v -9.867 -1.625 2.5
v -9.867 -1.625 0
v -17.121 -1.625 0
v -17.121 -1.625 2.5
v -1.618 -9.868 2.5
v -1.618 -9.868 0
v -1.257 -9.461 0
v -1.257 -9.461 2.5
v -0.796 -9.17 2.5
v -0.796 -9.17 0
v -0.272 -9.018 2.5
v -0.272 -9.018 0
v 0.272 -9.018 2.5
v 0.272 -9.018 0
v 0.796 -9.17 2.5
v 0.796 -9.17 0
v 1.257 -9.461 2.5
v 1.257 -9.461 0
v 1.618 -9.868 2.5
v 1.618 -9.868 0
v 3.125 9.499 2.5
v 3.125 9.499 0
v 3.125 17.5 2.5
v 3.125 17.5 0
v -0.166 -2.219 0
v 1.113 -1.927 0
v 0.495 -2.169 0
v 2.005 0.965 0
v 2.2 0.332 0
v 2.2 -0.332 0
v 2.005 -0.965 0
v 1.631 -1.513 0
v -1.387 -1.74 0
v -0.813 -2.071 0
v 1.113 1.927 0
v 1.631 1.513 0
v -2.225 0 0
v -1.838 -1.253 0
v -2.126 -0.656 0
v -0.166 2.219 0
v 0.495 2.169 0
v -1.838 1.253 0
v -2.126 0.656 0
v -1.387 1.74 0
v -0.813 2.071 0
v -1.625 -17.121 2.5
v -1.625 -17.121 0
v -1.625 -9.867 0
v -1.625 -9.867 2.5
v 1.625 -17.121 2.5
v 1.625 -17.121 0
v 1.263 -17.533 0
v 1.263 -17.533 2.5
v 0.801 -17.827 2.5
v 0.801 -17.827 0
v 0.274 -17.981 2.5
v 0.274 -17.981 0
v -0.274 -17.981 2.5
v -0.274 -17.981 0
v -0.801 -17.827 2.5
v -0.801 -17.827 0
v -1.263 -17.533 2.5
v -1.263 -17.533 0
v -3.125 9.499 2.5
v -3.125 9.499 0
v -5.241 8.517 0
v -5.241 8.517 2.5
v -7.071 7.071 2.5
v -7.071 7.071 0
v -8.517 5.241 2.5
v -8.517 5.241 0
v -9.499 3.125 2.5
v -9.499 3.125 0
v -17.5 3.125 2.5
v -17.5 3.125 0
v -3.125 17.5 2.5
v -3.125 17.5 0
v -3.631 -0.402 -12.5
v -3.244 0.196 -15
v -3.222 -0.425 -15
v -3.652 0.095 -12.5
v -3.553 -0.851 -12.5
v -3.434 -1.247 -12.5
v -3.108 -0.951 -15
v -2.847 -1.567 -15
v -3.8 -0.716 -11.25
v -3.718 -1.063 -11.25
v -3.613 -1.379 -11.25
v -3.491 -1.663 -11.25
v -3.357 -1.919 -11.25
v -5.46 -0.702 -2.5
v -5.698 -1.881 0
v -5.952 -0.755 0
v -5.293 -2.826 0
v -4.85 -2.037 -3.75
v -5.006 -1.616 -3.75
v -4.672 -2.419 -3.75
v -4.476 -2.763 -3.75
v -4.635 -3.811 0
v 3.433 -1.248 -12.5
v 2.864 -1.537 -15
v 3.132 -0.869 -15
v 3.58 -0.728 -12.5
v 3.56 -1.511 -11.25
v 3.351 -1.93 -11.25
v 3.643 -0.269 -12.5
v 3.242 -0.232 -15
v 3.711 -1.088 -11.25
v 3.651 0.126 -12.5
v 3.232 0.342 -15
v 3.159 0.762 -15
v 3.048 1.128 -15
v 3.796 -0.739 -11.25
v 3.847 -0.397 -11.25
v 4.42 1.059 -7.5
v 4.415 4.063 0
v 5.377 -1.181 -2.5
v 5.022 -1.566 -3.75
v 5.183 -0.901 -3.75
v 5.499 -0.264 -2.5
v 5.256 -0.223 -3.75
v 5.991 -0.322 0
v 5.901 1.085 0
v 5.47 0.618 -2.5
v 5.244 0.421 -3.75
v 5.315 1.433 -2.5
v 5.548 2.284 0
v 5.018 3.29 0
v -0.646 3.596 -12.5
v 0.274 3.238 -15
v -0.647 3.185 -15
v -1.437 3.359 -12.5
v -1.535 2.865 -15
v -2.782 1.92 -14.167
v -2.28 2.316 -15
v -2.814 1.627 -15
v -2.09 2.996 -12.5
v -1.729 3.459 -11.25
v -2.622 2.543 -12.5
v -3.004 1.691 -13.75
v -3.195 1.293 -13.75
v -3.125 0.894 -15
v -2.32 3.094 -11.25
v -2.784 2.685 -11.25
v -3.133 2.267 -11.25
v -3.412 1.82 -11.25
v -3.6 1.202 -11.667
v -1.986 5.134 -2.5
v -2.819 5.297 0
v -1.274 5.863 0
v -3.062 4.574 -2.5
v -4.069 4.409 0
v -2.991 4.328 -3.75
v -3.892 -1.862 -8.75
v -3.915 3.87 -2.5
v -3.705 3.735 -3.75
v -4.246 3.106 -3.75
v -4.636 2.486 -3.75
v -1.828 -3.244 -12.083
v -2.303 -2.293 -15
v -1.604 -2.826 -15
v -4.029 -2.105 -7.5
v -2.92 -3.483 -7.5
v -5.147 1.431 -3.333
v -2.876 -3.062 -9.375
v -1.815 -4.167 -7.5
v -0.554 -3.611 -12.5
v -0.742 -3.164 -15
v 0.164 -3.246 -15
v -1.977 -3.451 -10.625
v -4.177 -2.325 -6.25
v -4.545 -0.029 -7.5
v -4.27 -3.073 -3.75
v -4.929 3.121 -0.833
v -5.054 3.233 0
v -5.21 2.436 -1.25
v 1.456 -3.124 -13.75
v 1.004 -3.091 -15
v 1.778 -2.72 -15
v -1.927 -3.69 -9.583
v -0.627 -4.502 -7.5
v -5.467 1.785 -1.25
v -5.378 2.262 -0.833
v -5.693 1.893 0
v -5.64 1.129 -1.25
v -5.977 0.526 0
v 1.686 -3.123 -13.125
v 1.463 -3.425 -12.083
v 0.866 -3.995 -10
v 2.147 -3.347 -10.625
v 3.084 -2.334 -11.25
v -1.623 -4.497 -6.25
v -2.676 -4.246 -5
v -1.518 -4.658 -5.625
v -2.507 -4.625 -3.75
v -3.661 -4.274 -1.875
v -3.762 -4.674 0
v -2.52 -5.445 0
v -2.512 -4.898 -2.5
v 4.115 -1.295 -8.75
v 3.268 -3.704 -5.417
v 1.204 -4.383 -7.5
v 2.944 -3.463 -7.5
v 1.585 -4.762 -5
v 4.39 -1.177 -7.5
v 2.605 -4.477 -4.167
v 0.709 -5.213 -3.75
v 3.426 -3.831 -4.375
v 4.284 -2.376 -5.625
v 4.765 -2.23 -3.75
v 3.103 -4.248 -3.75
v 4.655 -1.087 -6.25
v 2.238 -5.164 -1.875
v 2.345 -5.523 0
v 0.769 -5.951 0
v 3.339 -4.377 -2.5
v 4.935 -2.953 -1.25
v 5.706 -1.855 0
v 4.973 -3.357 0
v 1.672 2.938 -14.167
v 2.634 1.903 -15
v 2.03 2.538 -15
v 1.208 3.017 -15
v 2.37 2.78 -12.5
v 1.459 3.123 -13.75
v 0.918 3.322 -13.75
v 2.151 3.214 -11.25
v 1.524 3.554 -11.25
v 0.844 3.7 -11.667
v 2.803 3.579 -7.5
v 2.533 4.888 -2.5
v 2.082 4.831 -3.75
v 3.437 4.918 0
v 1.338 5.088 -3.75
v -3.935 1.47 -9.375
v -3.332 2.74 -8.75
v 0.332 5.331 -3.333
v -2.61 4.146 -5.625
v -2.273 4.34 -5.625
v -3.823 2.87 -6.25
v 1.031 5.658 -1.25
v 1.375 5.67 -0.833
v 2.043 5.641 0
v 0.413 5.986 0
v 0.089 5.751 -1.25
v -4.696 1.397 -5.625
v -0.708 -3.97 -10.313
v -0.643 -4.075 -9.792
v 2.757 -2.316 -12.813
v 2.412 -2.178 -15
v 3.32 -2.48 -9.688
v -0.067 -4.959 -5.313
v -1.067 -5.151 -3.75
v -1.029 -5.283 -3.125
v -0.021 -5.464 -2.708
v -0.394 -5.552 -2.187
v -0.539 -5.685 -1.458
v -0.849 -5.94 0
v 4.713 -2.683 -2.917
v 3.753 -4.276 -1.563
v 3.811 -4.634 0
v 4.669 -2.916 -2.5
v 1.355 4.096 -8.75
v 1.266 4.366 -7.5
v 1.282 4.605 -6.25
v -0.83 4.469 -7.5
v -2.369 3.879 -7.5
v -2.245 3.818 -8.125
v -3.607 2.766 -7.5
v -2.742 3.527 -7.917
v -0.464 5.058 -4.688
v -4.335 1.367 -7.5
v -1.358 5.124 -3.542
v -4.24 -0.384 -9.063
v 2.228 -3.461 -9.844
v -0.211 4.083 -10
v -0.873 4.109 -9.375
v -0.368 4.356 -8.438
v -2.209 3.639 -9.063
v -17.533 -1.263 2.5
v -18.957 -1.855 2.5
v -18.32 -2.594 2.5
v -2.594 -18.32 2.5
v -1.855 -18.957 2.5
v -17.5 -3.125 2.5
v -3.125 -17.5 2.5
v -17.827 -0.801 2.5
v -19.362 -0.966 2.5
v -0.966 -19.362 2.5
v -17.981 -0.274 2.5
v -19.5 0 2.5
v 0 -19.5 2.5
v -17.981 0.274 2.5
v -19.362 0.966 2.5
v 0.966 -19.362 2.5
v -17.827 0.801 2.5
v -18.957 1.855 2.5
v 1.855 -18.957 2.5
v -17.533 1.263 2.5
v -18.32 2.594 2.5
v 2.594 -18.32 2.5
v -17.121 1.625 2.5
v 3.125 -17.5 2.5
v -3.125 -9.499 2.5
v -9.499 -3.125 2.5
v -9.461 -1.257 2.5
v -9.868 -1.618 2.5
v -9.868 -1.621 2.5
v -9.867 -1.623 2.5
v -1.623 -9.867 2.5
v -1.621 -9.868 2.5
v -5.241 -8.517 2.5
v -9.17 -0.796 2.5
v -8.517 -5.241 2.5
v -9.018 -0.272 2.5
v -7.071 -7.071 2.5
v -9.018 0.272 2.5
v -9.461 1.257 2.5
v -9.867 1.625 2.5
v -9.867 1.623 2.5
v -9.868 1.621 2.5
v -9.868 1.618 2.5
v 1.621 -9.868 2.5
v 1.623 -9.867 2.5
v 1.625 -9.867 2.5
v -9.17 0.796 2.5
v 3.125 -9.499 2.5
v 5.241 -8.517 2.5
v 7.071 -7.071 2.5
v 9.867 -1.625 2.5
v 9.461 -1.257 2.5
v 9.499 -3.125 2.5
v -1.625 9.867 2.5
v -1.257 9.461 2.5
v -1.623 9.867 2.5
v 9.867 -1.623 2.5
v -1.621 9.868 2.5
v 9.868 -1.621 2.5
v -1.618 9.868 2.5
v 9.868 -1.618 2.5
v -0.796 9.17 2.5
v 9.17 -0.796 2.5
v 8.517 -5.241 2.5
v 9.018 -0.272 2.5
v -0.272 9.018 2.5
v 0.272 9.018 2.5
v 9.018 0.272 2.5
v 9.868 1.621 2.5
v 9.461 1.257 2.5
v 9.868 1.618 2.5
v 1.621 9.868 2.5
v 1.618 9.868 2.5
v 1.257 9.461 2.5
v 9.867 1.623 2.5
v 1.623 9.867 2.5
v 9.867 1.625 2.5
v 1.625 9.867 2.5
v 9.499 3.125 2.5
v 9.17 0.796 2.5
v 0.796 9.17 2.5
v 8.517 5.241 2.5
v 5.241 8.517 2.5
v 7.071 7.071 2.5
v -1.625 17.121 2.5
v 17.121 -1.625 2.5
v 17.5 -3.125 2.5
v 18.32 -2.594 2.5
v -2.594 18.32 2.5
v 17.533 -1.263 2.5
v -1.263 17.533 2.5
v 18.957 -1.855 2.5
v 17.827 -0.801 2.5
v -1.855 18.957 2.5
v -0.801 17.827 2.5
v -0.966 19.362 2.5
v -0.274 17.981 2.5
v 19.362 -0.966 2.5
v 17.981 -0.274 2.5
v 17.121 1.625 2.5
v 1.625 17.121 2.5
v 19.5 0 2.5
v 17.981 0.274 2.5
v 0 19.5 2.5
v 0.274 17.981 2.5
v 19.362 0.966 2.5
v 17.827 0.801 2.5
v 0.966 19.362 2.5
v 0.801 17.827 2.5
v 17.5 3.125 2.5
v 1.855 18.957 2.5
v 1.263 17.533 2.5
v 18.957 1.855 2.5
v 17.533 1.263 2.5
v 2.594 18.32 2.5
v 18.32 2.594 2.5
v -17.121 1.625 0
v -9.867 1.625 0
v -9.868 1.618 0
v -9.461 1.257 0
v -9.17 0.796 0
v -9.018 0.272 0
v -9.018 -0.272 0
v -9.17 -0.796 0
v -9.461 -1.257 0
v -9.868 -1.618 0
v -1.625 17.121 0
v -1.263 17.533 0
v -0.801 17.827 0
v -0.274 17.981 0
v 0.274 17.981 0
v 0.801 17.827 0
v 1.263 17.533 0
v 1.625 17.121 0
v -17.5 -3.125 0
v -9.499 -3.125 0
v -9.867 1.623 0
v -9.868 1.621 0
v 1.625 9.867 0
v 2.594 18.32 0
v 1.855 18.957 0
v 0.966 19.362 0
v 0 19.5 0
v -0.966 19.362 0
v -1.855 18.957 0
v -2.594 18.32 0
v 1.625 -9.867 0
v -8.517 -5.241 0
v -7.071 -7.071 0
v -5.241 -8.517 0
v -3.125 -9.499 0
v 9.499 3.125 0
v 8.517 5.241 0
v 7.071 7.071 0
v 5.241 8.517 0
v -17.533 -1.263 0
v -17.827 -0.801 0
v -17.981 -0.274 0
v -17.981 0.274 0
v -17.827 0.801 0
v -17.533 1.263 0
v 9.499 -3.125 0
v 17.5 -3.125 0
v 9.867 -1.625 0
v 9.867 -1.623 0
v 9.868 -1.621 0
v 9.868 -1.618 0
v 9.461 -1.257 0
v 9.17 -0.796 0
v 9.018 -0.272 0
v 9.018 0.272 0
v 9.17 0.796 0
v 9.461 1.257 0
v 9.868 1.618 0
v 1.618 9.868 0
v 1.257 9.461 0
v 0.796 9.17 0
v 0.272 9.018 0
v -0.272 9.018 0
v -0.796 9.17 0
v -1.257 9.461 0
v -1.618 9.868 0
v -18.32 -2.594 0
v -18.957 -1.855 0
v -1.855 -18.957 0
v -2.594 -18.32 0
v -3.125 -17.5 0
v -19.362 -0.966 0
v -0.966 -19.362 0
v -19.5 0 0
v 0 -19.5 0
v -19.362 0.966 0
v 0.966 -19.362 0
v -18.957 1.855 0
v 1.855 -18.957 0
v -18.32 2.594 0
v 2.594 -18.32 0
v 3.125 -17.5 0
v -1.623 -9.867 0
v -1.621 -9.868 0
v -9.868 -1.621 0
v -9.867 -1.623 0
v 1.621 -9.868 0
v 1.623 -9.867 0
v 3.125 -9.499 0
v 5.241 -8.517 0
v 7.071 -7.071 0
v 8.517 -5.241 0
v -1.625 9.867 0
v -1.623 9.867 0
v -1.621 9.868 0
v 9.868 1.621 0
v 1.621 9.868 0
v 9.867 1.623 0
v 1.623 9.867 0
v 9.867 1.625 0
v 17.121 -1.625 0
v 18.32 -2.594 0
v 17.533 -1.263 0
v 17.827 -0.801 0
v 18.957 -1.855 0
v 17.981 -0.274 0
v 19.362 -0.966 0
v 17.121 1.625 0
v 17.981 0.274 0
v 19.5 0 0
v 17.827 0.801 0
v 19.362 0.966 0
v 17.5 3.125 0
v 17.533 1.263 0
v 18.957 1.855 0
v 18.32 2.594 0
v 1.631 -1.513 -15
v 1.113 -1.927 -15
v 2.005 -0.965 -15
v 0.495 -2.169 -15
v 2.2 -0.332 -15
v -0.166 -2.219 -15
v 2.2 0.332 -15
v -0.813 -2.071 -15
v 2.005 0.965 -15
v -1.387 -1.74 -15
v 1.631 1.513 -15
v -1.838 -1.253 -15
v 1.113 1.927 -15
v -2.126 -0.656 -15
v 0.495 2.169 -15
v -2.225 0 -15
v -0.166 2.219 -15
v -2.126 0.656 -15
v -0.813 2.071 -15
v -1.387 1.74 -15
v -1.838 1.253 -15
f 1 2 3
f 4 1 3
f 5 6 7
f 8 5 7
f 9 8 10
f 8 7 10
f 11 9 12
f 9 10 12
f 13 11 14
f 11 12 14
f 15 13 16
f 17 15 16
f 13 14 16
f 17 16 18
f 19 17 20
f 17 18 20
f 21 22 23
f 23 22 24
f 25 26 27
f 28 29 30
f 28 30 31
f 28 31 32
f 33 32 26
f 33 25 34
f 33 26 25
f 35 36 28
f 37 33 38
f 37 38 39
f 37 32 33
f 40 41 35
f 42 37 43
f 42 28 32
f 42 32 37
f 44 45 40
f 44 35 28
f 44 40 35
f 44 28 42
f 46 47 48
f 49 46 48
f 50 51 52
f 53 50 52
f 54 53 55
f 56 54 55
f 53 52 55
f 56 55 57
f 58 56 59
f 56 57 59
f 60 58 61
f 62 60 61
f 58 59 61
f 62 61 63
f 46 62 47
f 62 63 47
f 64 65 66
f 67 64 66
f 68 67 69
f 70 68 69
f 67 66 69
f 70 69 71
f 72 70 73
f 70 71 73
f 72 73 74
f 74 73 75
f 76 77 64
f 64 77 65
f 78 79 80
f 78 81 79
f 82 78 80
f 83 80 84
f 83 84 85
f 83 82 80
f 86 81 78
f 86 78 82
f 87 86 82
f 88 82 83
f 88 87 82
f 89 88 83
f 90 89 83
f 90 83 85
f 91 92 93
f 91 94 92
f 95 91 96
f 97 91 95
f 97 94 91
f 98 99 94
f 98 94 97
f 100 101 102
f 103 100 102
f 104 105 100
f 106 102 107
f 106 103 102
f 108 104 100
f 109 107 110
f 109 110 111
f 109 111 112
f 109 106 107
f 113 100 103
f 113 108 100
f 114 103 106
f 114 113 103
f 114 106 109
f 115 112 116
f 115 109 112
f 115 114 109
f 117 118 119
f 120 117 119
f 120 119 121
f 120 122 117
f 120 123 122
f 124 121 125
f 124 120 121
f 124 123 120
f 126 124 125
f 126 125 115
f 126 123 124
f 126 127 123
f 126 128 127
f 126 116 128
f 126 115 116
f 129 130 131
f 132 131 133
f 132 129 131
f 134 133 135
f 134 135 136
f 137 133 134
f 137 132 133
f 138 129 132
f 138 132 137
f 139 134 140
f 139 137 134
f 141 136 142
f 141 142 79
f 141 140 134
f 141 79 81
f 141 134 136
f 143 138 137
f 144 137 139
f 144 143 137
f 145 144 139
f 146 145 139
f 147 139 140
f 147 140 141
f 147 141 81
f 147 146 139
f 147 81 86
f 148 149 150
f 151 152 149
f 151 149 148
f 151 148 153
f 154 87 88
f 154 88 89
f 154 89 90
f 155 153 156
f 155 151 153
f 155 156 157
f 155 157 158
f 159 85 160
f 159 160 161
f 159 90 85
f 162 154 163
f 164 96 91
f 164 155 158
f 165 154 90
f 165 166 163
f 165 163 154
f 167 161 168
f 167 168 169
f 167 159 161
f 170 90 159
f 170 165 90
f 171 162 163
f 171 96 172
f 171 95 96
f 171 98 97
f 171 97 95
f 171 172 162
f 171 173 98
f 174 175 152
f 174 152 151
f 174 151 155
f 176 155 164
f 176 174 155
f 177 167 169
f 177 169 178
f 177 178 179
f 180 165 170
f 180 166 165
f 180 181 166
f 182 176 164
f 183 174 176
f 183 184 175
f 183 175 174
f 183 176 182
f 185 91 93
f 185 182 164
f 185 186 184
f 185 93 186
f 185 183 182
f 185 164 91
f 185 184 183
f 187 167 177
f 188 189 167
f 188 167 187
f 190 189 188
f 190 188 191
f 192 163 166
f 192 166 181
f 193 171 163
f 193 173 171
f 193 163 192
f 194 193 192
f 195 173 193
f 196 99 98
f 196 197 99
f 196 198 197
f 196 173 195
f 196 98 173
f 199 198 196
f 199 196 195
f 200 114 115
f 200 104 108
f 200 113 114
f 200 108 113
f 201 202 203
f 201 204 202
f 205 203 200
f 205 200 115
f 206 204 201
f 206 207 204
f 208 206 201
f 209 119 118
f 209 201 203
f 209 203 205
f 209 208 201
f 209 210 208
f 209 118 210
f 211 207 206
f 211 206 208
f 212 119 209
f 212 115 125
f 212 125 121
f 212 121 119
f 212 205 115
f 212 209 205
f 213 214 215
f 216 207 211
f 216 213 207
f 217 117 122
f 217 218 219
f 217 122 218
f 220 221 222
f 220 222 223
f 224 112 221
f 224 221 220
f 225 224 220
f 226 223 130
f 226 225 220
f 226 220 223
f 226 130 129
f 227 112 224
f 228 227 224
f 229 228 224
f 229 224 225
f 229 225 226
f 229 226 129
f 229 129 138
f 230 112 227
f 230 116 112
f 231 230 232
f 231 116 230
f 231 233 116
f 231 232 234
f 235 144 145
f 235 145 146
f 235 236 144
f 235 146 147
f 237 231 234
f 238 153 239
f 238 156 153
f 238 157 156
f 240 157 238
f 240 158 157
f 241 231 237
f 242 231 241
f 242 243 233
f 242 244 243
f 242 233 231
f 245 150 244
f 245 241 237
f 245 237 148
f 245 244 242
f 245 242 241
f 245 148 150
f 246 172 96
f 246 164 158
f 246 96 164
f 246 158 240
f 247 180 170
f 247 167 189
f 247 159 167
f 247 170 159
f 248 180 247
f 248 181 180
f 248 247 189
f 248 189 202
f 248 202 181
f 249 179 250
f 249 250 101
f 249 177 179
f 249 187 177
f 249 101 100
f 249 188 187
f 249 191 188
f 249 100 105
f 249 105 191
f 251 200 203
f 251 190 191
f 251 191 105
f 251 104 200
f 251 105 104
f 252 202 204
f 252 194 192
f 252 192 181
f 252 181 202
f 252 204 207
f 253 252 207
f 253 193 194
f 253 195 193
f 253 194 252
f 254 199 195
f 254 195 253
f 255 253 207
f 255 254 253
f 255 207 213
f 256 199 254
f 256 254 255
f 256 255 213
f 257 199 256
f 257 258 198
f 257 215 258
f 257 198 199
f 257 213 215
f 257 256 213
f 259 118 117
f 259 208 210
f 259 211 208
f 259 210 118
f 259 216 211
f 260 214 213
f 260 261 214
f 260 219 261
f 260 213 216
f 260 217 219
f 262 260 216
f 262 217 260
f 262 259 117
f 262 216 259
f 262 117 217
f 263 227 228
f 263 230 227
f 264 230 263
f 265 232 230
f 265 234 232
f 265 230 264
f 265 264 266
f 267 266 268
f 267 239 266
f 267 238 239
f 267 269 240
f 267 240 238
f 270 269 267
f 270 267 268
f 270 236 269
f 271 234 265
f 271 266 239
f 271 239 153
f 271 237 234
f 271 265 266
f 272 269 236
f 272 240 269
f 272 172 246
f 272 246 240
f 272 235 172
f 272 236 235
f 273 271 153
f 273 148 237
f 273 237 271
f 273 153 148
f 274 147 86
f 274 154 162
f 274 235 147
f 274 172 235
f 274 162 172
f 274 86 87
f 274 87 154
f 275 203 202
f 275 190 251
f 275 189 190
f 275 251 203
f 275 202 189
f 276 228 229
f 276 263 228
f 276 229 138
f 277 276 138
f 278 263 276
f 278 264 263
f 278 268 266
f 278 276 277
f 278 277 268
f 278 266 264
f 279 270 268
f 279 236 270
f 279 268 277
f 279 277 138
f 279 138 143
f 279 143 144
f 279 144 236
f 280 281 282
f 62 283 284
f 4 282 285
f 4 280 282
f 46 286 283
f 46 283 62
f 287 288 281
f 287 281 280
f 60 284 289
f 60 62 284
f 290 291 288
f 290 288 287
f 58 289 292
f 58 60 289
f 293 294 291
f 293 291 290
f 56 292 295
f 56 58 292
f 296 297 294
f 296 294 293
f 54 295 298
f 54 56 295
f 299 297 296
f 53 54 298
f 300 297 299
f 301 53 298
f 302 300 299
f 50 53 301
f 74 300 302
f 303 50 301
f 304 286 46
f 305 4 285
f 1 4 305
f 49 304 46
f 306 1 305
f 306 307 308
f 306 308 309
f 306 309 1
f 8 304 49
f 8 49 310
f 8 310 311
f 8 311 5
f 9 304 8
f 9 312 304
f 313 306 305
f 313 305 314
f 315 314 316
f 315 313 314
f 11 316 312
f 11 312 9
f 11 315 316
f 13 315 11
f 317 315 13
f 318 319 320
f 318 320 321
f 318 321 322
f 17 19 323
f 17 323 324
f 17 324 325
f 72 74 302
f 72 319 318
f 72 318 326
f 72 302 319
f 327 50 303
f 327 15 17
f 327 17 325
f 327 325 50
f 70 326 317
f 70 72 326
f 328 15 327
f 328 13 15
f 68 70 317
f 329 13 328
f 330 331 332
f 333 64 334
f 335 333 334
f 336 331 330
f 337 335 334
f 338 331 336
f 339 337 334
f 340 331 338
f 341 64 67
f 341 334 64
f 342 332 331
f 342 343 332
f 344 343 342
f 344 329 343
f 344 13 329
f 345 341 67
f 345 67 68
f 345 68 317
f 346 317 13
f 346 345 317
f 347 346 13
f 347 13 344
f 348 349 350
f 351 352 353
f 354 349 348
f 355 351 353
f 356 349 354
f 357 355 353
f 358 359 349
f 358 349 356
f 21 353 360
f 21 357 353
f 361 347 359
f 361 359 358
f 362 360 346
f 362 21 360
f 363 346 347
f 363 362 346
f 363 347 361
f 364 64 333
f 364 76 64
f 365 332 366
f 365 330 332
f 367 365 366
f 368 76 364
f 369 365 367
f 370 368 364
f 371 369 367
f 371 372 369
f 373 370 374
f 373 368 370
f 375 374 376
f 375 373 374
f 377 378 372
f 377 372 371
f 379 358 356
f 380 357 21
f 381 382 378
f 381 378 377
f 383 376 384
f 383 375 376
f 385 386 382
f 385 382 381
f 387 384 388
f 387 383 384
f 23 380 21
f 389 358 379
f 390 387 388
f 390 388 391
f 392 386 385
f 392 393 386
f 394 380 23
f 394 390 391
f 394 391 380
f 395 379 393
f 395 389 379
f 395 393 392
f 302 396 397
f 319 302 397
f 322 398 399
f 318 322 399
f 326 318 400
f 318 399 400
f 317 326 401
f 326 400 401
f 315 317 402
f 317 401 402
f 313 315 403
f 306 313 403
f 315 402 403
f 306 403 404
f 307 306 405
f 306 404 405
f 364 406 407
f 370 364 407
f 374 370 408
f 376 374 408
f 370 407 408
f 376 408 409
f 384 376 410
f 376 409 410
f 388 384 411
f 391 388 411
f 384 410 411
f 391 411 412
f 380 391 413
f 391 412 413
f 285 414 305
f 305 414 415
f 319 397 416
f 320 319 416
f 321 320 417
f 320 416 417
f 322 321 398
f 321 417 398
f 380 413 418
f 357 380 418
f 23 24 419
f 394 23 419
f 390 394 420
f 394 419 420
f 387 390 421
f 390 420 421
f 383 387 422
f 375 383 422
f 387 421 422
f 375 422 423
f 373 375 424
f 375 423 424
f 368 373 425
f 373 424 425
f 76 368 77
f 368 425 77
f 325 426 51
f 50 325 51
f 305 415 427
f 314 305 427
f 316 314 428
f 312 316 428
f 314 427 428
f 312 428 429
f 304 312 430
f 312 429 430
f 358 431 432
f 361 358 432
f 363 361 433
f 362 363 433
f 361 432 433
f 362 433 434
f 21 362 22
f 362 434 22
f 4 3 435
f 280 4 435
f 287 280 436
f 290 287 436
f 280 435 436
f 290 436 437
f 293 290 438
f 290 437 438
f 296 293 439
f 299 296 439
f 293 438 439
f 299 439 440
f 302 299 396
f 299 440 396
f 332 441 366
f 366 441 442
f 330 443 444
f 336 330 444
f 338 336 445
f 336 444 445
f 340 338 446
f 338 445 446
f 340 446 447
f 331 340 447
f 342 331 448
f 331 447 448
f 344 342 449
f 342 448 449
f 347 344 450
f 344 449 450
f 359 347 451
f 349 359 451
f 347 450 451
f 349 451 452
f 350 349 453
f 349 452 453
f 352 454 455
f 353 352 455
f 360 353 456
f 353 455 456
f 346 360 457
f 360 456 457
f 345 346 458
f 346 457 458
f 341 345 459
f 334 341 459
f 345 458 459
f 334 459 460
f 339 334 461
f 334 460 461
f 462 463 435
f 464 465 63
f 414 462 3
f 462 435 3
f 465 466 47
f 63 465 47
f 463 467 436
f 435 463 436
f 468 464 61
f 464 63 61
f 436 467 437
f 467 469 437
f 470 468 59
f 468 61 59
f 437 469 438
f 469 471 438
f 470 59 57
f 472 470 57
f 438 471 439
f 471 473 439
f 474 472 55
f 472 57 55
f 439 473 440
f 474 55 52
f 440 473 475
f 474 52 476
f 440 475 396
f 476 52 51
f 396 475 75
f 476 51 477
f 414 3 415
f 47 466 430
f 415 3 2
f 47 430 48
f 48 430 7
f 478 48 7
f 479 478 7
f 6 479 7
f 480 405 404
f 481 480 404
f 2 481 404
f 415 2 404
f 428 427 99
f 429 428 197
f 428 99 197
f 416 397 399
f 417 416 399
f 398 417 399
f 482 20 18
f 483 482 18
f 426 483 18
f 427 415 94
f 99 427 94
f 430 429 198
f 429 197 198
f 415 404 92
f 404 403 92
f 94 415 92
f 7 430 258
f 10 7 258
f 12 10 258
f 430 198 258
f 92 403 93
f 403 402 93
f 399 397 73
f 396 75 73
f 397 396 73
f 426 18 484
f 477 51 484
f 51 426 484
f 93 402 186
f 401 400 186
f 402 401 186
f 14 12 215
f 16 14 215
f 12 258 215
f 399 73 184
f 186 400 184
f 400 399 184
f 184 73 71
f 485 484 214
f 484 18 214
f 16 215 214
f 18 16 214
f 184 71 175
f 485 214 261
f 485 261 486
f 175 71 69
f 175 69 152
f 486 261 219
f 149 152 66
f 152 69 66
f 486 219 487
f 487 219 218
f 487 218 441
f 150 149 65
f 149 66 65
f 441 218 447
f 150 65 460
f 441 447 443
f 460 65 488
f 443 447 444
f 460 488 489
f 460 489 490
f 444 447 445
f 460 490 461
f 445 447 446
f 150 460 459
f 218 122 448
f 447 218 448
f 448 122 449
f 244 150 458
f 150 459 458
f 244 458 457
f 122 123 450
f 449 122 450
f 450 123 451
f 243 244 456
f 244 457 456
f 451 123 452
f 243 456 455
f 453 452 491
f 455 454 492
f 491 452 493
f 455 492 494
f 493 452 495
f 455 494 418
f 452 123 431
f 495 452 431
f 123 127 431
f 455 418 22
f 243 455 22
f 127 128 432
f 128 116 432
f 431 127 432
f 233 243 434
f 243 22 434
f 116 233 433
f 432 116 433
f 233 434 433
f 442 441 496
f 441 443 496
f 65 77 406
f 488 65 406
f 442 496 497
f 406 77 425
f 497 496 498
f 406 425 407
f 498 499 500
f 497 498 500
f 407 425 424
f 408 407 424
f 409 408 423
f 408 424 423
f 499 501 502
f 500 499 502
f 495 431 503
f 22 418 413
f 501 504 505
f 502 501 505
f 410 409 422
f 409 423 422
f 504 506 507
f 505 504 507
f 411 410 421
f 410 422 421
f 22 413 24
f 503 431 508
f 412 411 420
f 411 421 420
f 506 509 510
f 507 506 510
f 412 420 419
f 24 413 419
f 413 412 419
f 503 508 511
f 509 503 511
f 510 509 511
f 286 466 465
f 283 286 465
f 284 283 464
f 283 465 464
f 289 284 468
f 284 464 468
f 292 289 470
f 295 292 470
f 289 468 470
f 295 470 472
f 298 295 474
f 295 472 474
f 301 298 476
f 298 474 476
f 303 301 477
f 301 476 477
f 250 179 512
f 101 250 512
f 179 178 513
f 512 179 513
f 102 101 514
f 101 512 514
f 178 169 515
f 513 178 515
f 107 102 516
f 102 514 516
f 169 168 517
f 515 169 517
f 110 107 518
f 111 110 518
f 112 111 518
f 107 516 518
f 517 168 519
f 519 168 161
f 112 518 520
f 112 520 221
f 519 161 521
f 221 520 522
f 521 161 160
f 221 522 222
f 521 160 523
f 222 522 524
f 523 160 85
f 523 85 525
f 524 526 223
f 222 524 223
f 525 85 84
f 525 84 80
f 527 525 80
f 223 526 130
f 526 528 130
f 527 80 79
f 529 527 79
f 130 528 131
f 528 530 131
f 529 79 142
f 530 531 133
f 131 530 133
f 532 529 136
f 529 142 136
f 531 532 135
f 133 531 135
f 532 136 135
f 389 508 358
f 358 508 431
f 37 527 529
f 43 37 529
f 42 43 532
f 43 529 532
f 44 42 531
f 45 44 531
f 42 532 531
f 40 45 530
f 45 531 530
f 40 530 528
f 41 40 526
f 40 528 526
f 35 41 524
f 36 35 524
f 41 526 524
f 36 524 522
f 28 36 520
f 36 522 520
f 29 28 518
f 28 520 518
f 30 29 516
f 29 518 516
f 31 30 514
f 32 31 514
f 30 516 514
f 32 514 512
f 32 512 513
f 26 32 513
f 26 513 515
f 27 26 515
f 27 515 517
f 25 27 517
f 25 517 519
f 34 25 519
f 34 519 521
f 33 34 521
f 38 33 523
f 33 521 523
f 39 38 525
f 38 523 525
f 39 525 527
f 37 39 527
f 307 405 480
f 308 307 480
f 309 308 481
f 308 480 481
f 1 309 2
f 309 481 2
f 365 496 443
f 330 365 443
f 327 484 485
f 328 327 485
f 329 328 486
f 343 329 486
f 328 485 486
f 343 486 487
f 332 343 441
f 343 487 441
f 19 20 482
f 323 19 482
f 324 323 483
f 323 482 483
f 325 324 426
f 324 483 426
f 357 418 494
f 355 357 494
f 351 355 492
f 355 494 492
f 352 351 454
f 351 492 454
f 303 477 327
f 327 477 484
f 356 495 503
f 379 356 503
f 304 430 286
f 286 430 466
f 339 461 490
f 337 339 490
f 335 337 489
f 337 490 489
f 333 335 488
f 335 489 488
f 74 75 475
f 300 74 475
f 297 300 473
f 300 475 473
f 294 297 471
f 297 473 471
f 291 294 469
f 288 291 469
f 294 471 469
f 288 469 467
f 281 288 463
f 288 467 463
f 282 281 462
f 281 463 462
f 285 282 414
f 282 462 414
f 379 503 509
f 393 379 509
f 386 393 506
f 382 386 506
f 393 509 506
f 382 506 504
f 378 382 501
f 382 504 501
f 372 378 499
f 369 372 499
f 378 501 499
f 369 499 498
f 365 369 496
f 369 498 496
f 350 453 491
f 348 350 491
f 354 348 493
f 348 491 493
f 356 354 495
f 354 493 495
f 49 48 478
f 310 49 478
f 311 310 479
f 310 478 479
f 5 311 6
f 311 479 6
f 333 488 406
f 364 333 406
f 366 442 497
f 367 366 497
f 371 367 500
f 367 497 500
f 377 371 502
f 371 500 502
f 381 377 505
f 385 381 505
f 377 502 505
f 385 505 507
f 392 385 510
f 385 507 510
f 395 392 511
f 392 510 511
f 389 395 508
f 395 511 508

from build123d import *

# Parameters (mm, degrees)
BOSS_EXTRUDE1_DEPTH = 2.5
SKETCH16_R          = 2.225
CUT_EXTRUDE2_DEPTH  = 15


with BuildPart() as part:
    # Sketch1 → Boss-Extrude1 (new body)
    with BuildSketch(Plane.XY):
        with BuildLine():
            Line((3.125, -17.5), (3.125, -9.499177596))
            ThreePointArc((3.125, -9.499177596), (7.071067812, -7.071067812), (9.499177596, -3.125))
            Line((9.499177596, -3.125), (17.5, -3.125))
            ThreePointArc((17.5, -3.125), (19.5, 0), (17.5, 3.125))
            Line((17.5, 3.125), (9.499177596, 3.125))
            ThreePointArc((9.499177596, 3.125), (7.071067812, 7.071067812), (3.125, 9.499177596))
            Line((3.125, 9.499177596), (3.125, 17.5))
            ThreePointArc((3.125, 17.5), (0, 19.5), (-3.125, 17.5))
            Line((-3.125, 17.5), (-3.125, 9.499177596))
            ThreePointArc((-3.125, 9.499177596), (-7.071067812, 7.071067812), (-9.499177596, 3.125))
            Line((-9.499177596, 3.125), (-17.5, 3.125))
            ThreePointArc((-17.5, 3.125), (-19.5, 0), (-17.5, -3.125))
            Line((-17.5, -3.125), (-9.499177596, -3.125))
            ThreePointArc((-9.499177596, -3.125), (-7.071067812, -7.071067812), (-3.125, -9.499177596))
            Line((-3.125, -9.499177596), (-3.125, -17.5))
            ThreePointArc((-3.125, -17.5), (0, -19.5), (3.125, -17.5))
        make_face()
        with BuildLine():
            ThreePointArc((-9.868180698, -1.618335477), (-9.86763363, -1.621667831), (-9.867085436, -1.625))
            Line((-9.867085436, -1.625), (-9.878306468, -1.625))
            Line((-9.878306468, -1.625), (-17.120871128, -1.625))
            ThreePointArc((-17.120871128, -1.625), (-18, 0), (-17.120871128, 1.625))
            Line((-17.120871128, 1.625), (-9.878306468, 1.625))
            Line((-9.878306468, 1.625), (-9.867085436, 1.625))
            ThreePointArc((-9.867085436, 1.625), (-9.86763363, 1.621667831), (-9.868180698, 1.618335477))
            ThreePointArc((-9.868180698, 1.618335477), (-8.999177596, 0), (-9.868180698, -1.618335477))
        make_face(mode=Mode.SUBTRACT)
        with BuildLine():
            ThreePointArc((-1.618335477, -9.868180698), (0, -8.999177596), (1.618335477, -9.868180698))
            ThreePointArc((1.618335477, -9.868180698), (1.621667831, -9.86763363), (1.625, -9.867085436))
            Line((1.625, -9.867085436), (1.625, -9.878306468))
            Line((1.625, -9.878306468), (1.625, -17.120871128))
            ThreePointArc((1.625, -17.120871128), (0, -18), (-1.625, -17.120871128))
            Line((-1.625, -17.120871128), (-1.625, -9.878306468))
            Line((-1.625, -9.878306468), (-1.625, -9.867085436))
            ThreePointArc((-1.625, -9.867085436), (-1.621667831, -9.86763363), (-1.618335477, -9.868180698))
        make_face(mode=Mode.SUBTRACT)
        with BuildLine():
            Line((1.625, 9.878306468), (1.625, 9.867085436))
            ThreePointArc((1.625, 9.867085436), (1.621667831, 9.86763363), (1.618335477, 9.868180698))
            ThreePointArc((1.618335477, 9.868180698), (0, 8.999177596), (-1.618335477, 9.868180698))
            ThreePointArc((-1.618335477, 9.868180698), (-1.621667831, 9.86763363), (-1.625, 9.867085436))
            Line((-1.625, 9.867085436), (-1.625, 9.878306468))
            Line((-1.625, 9.878306468), (-1.625, 17.120871128))
            ThreePointArc((-1.625, 17.120871128), (0, 18), (1.625, 17.120871128))
            Line((1.625, 17.120871128), (1.625, 9.878306468))
        make_face(mode=Mode.SUBTRACT)
        with BuildLine():
            ThreePointArc((9.868180698, 1.618335477), (9.86763363, 1.621667831), (9.867085436, 1.625))
            Line((9.867085436, 1.625), (9.878306468, 1.625))
            Line((9.878306468, 1.625), (17.120871128, 1.625))
            ThreePointArc((17.120871128, 1.625), (18, 0), (17.120871128, -1.625))
            Line((17.120871128, -1.625), (9.878306468, -1.625))
            Line((9.878306468, -1.625), (9.867085436, -1.625))
            ThreePointArc((9.867085436, -1.625), (9.86763363, -1.621667831), (9.868180698, -1.618335477))
            ThreePointArc((9.868180698, -1.618335477), (8.999177596, 0), (9.868180698, 1.618335477))
        make_face(mode=Mode.SUBTRACT)
    extrude(amount=BOSS_EXTRUDE1_DEPTH)

    # Loft2: read off the stored shape, not the designer's step
    # Loft2: loft between two sections, ruled curve by curve
    loft2_from = [
        Edge.make_bspline([(3.048060313, 1.127753665, -15), (0.792552983, 7.223874291, -15), (-5.303567643, 4.968366961, -15), (-3.048060313, -1.127753665, -15), (-0.792552983, -7.223874291, -15), (5.303567643, -4.968366961, -15), (3.048060313, 1.127753665, -15)], [0, 0, 0, 0, 0.5, 0.5, 0.5, 1, 1, 1, 1], 3, [1, 0.333333333, 0.333333333, 1, 0.333333333, 0.333333333, 1]),
    ]
    loft2_to = [
        Edge.make_bspline([(4.41488096, 4.063105476, 0), (-3.711329991, 12.892867396, 0), (-12.541091911, 4.766656445, 0), (-4.41488096, -4.063105476, 0), (3.711329991, -12.892867396, 0), (12.541091911, -4.766656445, 0), (4.41488096, 4.063105476, 0)], [0, 0, 0, 0, 0.5, 0.5, 0.5, 1, 1, 1, 1], 3, [1, 0.333333333, 0.333333333, 1, 0.333333333, 0.333333333, 1]),
    ]
    loft2 = Solid(Shell([*[Face.make_surface_from_curves(loft2_from[k], loft2_to[k]) for k in range(1)], Face(Wire(loft2_from)), Face(Wire(loft2_to))]))
    add(loft2)

    # Sketch16 → Cut-Extrude2 (cut)
    with BuildSketch(Plane(origin=(0, 0, -15), x_dir=(-1, 0, 0), z_dir=(0, 0, -1))):
        Circle(SKETCH16_R)
    extrude(amount=-CUT_EXTRUDE2_DEPTH, mode=Mode.SUBTRACT)


solid = part.part
